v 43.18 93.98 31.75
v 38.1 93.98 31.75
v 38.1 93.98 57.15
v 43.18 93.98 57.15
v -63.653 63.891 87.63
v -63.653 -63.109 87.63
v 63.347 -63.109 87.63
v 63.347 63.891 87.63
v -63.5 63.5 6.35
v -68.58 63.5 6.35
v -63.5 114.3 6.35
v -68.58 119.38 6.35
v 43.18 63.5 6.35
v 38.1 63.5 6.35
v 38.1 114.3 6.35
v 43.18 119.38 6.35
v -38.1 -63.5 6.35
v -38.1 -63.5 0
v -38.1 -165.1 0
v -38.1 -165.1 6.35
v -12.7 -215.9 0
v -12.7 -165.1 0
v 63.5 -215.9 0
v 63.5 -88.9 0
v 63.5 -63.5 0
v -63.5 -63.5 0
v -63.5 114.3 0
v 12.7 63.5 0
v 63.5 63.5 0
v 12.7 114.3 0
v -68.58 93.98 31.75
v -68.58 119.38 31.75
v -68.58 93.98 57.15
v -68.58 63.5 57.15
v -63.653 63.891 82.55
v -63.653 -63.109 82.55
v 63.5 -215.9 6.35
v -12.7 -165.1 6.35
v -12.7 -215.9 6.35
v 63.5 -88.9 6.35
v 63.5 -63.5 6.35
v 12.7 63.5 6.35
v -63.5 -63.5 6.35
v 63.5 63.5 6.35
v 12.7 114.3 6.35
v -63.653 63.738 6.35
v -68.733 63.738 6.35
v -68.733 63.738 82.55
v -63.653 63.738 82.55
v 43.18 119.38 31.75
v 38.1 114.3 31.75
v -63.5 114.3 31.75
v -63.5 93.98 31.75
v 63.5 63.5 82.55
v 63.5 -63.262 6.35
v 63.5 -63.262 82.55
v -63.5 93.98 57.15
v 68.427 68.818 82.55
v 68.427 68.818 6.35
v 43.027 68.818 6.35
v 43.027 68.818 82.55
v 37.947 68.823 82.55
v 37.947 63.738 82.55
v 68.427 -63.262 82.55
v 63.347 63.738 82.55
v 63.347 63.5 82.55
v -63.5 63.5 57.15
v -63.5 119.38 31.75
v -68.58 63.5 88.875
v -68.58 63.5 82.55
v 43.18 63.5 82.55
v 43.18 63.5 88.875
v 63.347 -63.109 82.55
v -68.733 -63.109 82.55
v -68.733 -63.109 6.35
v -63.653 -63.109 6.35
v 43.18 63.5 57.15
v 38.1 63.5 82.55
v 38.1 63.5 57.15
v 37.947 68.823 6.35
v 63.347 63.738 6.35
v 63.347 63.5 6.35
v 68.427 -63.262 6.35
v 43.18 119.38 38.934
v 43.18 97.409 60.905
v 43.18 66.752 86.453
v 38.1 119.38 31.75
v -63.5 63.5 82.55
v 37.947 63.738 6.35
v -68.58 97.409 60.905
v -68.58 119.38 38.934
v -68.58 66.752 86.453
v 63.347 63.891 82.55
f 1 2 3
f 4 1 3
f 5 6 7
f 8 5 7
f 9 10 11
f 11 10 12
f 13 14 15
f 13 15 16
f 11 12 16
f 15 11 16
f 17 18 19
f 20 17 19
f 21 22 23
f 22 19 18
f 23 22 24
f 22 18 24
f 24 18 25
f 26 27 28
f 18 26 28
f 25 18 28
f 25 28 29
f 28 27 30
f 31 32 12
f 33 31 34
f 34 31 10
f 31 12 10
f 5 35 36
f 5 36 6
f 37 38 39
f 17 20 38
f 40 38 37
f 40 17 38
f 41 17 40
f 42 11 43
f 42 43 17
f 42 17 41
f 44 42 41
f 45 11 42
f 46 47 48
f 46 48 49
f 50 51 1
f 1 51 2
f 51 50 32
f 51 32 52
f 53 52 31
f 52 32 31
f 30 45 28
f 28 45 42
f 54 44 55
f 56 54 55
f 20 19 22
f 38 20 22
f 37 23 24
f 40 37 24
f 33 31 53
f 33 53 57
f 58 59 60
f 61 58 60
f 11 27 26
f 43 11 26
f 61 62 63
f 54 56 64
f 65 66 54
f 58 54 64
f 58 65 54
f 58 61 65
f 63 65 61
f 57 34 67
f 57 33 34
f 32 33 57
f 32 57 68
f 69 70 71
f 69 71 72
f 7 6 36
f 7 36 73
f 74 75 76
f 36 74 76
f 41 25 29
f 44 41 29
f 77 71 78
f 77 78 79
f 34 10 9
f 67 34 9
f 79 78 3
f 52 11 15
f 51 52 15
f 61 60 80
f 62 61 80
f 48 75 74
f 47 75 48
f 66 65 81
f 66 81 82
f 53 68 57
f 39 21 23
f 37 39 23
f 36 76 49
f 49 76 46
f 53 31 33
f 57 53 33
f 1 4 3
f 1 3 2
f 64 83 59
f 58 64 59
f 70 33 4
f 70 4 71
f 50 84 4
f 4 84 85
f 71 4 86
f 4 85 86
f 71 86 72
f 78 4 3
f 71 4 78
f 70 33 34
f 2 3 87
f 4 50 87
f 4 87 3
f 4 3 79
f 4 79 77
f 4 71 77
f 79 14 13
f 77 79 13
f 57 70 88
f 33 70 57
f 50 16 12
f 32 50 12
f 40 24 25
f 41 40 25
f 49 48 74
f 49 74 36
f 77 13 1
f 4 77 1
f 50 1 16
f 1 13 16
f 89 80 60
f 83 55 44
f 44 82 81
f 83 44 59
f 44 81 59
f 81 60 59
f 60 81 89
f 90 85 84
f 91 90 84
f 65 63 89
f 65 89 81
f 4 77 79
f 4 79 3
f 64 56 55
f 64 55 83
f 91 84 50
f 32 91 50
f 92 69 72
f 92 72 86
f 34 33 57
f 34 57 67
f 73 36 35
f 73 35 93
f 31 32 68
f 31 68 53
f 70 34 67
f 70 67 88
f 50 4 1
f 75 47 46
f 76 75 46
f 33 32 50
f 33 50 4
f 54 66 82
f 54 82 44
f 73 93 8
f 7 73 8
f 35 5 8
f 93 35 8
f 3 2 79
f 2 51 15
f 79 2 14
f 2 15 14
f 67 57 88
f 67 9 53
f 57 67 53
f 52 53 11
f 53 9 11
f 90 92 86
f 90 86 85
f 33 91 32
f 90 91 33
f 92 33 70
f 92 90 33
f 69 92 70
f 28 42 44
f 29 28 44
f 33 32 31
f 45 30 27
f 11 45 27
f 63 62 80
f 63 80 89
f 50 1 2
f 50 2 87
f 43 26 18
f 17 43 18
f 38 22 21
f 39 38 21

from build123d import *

# Parameters (mm, degrees)
F1_DEPTH  = 6.35
F2_DEPTH  = 6.35
F3_DEPTH  = 6.35
F4_DEPTH  = 6.35
F6_DEPTH  = 50.8
F5_W      = 25.4
F5_H      = 25.4
F7_DEPTH  = 25.4
F9_DEPTH  = 76.2
F8_W      = 5.08
F8_H      = 126.8470585346
F10_W     = 25.4
F10_H     = 25.4
F11_DEPTH = 114.3
F13_DEPTH = 5.08
F14_DEPTH = 111.76
F16_DEPTH = 5.08
F17_W     = 127
F17_H     = 5.08
F18_DEPTH = 127


with BuildPart() as f1:
    # F0 (on Top) → F1 (new body)
    with BuildSketch(Plane.XY):
        Polygon((-63.5, 114.3), (-63.5, 63.5), (38.1000001535, 63.5), (38.1000001535, 88.9), (38.1000001535, 114.3), (-38.1, 114.3), align=None)
    extrude(amount=F1_DEPTH)

    # F0 (on Top) → F2 (join)
    with BuildSketch(Plane.XY):
        Polygon((38.1000001535, 63.5), (-63.5, 63.5), (-63.5, -63.5), (-38.0999998465, -63.5), (-12.6999998465, -63.5), (12.7000001535, -63.5), (63.5, -63.5), (63.5, 63.5), align=None)
    extrude(amount=F2_DEPTH)

    # F0 (on Top) → F3 (join)
    with BuildSketch(Plane.XY):
        Polygon((-12.6999998465, -63.5), (-38.0999998465, -63.5), (-38.0999998465, -88.9), (-38.0999998465, -114.3), (-38.0999998465, -165.1), (-12.6999998465, -165.1), (63.5000001535, -165.1), (63.5000001535, -88.9), (63.5, -63.5), (12.7000001535, -63.5), align=None)
    extrude(amount=F3_DEPTH)

    # F0 (on Top) → F4 (join)
    with BuildSketch(Plane.XY):
        Polygon((63.5000001535, -215.9), (63.5000001535, -165.1), (-12.6999998465, -165.1), (-12.6999998465, -190.5), (-12.6999998465, -215.9), align=None)
    extrude(amount=F4_DEPTH)

    # F5 (on face) → F7 (cut)
    with BuildSketch(Plane.XY.offset(6.35)):
        with Locations((25.4000001535, 101.6)):
            Rectangle(F5_W, F5_H)
        with Locations((25.4000001535, 76.2)):
            Rectangle(F5_W, F5_H)
    extrude(amount=-F7_DEPTH, mode=Mode.SUBTRACT)


with BuildPart() as f6:
    # F5 (on face) → F6 (new body)
    with BuildSketch(Plane.XY.offset(6.35)):
        Polygon((-63.5, 63.5), (-63.5, 114.3), (12.7000001535, 114.3), (38.1000001535, 114.3), (38.1000001535, 88.9), (38.1000001535, 63.5), (43.1800001535, 63.5), (43.1800001535, 119.38), (-68.58, 119.38), (-68.58, 63.5), align=None)
    extrude(amount=F6_DEPTH)

    # F10 (on face) → F11 (cut)
    with BuildSketch(Plane(origin=(-68.58, 0, 0), x_dir=(0, -1, 0), z_dir=(-1, 0, 0))):
        with Locations((-106.68, 44.45)):
            Rectangle(F10_W, F10_H)
    extrude(amount=-F11_DEPTH, mode=Mode.SUBTRACT)


with BuildPart() as f9:
    # F8 (on face) → F9 (new body)
    with BuildSketch(Plane.XY.offset(6.35)):
        Polygon((37.9468661904, 68.8225999475), (37.9468661904, 63.7378320098), (63.3468661904, 63.7378320098), (63.3468661904, 63.5), (63.5, 63.5), (63.5, -63.2621679902), (68.4268661904, -63.2621679902), (68.4268661904, 68.8178320098), (43.0268661904, 68.8178320098), align=None)
    extrude(amount=F9_DEPTH)


with BuildPart() as f9b:
    # F8 (on face) → F9, piece 2 (new body)
    with BuildSketch(Plane.XY.offset(6.35)):
        with Locations((-66.1931338096, 0.3143027425)):
            Rectangle(F8_W, F8_H)
    extrude(amount=F9_DEPTH)


with BuildPart() as f13:
    # F12 (on face) → F13 (new body)
    with BuildSketch(Plane(origin=(-68.58, 0, 0), x_dir=(0, -1, 0), z_dir=(-1, 0, 0))):
        Polygon((-93.98, 31.75), (-93.98, 57.15), (-119.38, 31.75), align=None)
    extrude(amount=-F13_DEPTH)


with BuildPart() as f13b:
    # F12 (on face) → F13, piece 2 (new body)
    with BuildSketch(Plane(origin=(-68.58, 0, 0), x_dir=(0, -1, 0), z_dir=(-1, 0, 0))):
        Polygon((-63.5, 82.55), (-93.98, 57.15), (-63.5, 57.15), align=None)
    extrude(amount=-F13_DEPTH)


with BuildPart() as f14:
    # F12 (on face) → F14 (new body)
    with BuildSketch(Plane(origin=(-68.58, 0, 0), x_dir=(0, -1, 0), z_dir=(-1, 0, 0))):
        Polygon((-119.38, 31.75), (-93.98, 57.15), (-63.5, 82.55), (-63.5, 88.8746455312), (-66.7521367503, 86.4525641004), (-97.4091610275, 60.9050438693), (-119.38, 38.9342048969), align=None)
    extrude(amount=-F14_DEPTH)


with BuildPart() as f16:
    # F15 (on face) → F16 (new body)
    with BuildSketch(Plane.YZ.offset(43.1800001535)):
        Polygon((63.5, 57.15), (93.98, 57.15), (63.5, 82.55), align=None)
    extrude(amount=-F16_DEPTH)


with BuildPart() as f16b:
    # F15 (on face) → F16, piece 2 (new body)
    with BuildSketch(Plane.YZ.offset(43.1800001535)):
        Polygon((119.38, 31.75), (93.98, 57.15), (93.98, 31.75), align=None)
    extrude(amount=-F16_DEPTH)


with BuildPart() as f18:
    # F17 (on face) → F18 (new body)
    with BuildSketch(Plane.XZ.offset(63.1092265248)):
        with Locations((-0.1531338096, 85.09)):
            Rectangle(F17_W, F17_H)
    extrude(amount=-F18_DEPTH)


solid = Compound([f1.part, f6.part, f9.part, f9b.part, f13.part, f13b.part, f14.part, f16.part, f16b.part, f18.part])
